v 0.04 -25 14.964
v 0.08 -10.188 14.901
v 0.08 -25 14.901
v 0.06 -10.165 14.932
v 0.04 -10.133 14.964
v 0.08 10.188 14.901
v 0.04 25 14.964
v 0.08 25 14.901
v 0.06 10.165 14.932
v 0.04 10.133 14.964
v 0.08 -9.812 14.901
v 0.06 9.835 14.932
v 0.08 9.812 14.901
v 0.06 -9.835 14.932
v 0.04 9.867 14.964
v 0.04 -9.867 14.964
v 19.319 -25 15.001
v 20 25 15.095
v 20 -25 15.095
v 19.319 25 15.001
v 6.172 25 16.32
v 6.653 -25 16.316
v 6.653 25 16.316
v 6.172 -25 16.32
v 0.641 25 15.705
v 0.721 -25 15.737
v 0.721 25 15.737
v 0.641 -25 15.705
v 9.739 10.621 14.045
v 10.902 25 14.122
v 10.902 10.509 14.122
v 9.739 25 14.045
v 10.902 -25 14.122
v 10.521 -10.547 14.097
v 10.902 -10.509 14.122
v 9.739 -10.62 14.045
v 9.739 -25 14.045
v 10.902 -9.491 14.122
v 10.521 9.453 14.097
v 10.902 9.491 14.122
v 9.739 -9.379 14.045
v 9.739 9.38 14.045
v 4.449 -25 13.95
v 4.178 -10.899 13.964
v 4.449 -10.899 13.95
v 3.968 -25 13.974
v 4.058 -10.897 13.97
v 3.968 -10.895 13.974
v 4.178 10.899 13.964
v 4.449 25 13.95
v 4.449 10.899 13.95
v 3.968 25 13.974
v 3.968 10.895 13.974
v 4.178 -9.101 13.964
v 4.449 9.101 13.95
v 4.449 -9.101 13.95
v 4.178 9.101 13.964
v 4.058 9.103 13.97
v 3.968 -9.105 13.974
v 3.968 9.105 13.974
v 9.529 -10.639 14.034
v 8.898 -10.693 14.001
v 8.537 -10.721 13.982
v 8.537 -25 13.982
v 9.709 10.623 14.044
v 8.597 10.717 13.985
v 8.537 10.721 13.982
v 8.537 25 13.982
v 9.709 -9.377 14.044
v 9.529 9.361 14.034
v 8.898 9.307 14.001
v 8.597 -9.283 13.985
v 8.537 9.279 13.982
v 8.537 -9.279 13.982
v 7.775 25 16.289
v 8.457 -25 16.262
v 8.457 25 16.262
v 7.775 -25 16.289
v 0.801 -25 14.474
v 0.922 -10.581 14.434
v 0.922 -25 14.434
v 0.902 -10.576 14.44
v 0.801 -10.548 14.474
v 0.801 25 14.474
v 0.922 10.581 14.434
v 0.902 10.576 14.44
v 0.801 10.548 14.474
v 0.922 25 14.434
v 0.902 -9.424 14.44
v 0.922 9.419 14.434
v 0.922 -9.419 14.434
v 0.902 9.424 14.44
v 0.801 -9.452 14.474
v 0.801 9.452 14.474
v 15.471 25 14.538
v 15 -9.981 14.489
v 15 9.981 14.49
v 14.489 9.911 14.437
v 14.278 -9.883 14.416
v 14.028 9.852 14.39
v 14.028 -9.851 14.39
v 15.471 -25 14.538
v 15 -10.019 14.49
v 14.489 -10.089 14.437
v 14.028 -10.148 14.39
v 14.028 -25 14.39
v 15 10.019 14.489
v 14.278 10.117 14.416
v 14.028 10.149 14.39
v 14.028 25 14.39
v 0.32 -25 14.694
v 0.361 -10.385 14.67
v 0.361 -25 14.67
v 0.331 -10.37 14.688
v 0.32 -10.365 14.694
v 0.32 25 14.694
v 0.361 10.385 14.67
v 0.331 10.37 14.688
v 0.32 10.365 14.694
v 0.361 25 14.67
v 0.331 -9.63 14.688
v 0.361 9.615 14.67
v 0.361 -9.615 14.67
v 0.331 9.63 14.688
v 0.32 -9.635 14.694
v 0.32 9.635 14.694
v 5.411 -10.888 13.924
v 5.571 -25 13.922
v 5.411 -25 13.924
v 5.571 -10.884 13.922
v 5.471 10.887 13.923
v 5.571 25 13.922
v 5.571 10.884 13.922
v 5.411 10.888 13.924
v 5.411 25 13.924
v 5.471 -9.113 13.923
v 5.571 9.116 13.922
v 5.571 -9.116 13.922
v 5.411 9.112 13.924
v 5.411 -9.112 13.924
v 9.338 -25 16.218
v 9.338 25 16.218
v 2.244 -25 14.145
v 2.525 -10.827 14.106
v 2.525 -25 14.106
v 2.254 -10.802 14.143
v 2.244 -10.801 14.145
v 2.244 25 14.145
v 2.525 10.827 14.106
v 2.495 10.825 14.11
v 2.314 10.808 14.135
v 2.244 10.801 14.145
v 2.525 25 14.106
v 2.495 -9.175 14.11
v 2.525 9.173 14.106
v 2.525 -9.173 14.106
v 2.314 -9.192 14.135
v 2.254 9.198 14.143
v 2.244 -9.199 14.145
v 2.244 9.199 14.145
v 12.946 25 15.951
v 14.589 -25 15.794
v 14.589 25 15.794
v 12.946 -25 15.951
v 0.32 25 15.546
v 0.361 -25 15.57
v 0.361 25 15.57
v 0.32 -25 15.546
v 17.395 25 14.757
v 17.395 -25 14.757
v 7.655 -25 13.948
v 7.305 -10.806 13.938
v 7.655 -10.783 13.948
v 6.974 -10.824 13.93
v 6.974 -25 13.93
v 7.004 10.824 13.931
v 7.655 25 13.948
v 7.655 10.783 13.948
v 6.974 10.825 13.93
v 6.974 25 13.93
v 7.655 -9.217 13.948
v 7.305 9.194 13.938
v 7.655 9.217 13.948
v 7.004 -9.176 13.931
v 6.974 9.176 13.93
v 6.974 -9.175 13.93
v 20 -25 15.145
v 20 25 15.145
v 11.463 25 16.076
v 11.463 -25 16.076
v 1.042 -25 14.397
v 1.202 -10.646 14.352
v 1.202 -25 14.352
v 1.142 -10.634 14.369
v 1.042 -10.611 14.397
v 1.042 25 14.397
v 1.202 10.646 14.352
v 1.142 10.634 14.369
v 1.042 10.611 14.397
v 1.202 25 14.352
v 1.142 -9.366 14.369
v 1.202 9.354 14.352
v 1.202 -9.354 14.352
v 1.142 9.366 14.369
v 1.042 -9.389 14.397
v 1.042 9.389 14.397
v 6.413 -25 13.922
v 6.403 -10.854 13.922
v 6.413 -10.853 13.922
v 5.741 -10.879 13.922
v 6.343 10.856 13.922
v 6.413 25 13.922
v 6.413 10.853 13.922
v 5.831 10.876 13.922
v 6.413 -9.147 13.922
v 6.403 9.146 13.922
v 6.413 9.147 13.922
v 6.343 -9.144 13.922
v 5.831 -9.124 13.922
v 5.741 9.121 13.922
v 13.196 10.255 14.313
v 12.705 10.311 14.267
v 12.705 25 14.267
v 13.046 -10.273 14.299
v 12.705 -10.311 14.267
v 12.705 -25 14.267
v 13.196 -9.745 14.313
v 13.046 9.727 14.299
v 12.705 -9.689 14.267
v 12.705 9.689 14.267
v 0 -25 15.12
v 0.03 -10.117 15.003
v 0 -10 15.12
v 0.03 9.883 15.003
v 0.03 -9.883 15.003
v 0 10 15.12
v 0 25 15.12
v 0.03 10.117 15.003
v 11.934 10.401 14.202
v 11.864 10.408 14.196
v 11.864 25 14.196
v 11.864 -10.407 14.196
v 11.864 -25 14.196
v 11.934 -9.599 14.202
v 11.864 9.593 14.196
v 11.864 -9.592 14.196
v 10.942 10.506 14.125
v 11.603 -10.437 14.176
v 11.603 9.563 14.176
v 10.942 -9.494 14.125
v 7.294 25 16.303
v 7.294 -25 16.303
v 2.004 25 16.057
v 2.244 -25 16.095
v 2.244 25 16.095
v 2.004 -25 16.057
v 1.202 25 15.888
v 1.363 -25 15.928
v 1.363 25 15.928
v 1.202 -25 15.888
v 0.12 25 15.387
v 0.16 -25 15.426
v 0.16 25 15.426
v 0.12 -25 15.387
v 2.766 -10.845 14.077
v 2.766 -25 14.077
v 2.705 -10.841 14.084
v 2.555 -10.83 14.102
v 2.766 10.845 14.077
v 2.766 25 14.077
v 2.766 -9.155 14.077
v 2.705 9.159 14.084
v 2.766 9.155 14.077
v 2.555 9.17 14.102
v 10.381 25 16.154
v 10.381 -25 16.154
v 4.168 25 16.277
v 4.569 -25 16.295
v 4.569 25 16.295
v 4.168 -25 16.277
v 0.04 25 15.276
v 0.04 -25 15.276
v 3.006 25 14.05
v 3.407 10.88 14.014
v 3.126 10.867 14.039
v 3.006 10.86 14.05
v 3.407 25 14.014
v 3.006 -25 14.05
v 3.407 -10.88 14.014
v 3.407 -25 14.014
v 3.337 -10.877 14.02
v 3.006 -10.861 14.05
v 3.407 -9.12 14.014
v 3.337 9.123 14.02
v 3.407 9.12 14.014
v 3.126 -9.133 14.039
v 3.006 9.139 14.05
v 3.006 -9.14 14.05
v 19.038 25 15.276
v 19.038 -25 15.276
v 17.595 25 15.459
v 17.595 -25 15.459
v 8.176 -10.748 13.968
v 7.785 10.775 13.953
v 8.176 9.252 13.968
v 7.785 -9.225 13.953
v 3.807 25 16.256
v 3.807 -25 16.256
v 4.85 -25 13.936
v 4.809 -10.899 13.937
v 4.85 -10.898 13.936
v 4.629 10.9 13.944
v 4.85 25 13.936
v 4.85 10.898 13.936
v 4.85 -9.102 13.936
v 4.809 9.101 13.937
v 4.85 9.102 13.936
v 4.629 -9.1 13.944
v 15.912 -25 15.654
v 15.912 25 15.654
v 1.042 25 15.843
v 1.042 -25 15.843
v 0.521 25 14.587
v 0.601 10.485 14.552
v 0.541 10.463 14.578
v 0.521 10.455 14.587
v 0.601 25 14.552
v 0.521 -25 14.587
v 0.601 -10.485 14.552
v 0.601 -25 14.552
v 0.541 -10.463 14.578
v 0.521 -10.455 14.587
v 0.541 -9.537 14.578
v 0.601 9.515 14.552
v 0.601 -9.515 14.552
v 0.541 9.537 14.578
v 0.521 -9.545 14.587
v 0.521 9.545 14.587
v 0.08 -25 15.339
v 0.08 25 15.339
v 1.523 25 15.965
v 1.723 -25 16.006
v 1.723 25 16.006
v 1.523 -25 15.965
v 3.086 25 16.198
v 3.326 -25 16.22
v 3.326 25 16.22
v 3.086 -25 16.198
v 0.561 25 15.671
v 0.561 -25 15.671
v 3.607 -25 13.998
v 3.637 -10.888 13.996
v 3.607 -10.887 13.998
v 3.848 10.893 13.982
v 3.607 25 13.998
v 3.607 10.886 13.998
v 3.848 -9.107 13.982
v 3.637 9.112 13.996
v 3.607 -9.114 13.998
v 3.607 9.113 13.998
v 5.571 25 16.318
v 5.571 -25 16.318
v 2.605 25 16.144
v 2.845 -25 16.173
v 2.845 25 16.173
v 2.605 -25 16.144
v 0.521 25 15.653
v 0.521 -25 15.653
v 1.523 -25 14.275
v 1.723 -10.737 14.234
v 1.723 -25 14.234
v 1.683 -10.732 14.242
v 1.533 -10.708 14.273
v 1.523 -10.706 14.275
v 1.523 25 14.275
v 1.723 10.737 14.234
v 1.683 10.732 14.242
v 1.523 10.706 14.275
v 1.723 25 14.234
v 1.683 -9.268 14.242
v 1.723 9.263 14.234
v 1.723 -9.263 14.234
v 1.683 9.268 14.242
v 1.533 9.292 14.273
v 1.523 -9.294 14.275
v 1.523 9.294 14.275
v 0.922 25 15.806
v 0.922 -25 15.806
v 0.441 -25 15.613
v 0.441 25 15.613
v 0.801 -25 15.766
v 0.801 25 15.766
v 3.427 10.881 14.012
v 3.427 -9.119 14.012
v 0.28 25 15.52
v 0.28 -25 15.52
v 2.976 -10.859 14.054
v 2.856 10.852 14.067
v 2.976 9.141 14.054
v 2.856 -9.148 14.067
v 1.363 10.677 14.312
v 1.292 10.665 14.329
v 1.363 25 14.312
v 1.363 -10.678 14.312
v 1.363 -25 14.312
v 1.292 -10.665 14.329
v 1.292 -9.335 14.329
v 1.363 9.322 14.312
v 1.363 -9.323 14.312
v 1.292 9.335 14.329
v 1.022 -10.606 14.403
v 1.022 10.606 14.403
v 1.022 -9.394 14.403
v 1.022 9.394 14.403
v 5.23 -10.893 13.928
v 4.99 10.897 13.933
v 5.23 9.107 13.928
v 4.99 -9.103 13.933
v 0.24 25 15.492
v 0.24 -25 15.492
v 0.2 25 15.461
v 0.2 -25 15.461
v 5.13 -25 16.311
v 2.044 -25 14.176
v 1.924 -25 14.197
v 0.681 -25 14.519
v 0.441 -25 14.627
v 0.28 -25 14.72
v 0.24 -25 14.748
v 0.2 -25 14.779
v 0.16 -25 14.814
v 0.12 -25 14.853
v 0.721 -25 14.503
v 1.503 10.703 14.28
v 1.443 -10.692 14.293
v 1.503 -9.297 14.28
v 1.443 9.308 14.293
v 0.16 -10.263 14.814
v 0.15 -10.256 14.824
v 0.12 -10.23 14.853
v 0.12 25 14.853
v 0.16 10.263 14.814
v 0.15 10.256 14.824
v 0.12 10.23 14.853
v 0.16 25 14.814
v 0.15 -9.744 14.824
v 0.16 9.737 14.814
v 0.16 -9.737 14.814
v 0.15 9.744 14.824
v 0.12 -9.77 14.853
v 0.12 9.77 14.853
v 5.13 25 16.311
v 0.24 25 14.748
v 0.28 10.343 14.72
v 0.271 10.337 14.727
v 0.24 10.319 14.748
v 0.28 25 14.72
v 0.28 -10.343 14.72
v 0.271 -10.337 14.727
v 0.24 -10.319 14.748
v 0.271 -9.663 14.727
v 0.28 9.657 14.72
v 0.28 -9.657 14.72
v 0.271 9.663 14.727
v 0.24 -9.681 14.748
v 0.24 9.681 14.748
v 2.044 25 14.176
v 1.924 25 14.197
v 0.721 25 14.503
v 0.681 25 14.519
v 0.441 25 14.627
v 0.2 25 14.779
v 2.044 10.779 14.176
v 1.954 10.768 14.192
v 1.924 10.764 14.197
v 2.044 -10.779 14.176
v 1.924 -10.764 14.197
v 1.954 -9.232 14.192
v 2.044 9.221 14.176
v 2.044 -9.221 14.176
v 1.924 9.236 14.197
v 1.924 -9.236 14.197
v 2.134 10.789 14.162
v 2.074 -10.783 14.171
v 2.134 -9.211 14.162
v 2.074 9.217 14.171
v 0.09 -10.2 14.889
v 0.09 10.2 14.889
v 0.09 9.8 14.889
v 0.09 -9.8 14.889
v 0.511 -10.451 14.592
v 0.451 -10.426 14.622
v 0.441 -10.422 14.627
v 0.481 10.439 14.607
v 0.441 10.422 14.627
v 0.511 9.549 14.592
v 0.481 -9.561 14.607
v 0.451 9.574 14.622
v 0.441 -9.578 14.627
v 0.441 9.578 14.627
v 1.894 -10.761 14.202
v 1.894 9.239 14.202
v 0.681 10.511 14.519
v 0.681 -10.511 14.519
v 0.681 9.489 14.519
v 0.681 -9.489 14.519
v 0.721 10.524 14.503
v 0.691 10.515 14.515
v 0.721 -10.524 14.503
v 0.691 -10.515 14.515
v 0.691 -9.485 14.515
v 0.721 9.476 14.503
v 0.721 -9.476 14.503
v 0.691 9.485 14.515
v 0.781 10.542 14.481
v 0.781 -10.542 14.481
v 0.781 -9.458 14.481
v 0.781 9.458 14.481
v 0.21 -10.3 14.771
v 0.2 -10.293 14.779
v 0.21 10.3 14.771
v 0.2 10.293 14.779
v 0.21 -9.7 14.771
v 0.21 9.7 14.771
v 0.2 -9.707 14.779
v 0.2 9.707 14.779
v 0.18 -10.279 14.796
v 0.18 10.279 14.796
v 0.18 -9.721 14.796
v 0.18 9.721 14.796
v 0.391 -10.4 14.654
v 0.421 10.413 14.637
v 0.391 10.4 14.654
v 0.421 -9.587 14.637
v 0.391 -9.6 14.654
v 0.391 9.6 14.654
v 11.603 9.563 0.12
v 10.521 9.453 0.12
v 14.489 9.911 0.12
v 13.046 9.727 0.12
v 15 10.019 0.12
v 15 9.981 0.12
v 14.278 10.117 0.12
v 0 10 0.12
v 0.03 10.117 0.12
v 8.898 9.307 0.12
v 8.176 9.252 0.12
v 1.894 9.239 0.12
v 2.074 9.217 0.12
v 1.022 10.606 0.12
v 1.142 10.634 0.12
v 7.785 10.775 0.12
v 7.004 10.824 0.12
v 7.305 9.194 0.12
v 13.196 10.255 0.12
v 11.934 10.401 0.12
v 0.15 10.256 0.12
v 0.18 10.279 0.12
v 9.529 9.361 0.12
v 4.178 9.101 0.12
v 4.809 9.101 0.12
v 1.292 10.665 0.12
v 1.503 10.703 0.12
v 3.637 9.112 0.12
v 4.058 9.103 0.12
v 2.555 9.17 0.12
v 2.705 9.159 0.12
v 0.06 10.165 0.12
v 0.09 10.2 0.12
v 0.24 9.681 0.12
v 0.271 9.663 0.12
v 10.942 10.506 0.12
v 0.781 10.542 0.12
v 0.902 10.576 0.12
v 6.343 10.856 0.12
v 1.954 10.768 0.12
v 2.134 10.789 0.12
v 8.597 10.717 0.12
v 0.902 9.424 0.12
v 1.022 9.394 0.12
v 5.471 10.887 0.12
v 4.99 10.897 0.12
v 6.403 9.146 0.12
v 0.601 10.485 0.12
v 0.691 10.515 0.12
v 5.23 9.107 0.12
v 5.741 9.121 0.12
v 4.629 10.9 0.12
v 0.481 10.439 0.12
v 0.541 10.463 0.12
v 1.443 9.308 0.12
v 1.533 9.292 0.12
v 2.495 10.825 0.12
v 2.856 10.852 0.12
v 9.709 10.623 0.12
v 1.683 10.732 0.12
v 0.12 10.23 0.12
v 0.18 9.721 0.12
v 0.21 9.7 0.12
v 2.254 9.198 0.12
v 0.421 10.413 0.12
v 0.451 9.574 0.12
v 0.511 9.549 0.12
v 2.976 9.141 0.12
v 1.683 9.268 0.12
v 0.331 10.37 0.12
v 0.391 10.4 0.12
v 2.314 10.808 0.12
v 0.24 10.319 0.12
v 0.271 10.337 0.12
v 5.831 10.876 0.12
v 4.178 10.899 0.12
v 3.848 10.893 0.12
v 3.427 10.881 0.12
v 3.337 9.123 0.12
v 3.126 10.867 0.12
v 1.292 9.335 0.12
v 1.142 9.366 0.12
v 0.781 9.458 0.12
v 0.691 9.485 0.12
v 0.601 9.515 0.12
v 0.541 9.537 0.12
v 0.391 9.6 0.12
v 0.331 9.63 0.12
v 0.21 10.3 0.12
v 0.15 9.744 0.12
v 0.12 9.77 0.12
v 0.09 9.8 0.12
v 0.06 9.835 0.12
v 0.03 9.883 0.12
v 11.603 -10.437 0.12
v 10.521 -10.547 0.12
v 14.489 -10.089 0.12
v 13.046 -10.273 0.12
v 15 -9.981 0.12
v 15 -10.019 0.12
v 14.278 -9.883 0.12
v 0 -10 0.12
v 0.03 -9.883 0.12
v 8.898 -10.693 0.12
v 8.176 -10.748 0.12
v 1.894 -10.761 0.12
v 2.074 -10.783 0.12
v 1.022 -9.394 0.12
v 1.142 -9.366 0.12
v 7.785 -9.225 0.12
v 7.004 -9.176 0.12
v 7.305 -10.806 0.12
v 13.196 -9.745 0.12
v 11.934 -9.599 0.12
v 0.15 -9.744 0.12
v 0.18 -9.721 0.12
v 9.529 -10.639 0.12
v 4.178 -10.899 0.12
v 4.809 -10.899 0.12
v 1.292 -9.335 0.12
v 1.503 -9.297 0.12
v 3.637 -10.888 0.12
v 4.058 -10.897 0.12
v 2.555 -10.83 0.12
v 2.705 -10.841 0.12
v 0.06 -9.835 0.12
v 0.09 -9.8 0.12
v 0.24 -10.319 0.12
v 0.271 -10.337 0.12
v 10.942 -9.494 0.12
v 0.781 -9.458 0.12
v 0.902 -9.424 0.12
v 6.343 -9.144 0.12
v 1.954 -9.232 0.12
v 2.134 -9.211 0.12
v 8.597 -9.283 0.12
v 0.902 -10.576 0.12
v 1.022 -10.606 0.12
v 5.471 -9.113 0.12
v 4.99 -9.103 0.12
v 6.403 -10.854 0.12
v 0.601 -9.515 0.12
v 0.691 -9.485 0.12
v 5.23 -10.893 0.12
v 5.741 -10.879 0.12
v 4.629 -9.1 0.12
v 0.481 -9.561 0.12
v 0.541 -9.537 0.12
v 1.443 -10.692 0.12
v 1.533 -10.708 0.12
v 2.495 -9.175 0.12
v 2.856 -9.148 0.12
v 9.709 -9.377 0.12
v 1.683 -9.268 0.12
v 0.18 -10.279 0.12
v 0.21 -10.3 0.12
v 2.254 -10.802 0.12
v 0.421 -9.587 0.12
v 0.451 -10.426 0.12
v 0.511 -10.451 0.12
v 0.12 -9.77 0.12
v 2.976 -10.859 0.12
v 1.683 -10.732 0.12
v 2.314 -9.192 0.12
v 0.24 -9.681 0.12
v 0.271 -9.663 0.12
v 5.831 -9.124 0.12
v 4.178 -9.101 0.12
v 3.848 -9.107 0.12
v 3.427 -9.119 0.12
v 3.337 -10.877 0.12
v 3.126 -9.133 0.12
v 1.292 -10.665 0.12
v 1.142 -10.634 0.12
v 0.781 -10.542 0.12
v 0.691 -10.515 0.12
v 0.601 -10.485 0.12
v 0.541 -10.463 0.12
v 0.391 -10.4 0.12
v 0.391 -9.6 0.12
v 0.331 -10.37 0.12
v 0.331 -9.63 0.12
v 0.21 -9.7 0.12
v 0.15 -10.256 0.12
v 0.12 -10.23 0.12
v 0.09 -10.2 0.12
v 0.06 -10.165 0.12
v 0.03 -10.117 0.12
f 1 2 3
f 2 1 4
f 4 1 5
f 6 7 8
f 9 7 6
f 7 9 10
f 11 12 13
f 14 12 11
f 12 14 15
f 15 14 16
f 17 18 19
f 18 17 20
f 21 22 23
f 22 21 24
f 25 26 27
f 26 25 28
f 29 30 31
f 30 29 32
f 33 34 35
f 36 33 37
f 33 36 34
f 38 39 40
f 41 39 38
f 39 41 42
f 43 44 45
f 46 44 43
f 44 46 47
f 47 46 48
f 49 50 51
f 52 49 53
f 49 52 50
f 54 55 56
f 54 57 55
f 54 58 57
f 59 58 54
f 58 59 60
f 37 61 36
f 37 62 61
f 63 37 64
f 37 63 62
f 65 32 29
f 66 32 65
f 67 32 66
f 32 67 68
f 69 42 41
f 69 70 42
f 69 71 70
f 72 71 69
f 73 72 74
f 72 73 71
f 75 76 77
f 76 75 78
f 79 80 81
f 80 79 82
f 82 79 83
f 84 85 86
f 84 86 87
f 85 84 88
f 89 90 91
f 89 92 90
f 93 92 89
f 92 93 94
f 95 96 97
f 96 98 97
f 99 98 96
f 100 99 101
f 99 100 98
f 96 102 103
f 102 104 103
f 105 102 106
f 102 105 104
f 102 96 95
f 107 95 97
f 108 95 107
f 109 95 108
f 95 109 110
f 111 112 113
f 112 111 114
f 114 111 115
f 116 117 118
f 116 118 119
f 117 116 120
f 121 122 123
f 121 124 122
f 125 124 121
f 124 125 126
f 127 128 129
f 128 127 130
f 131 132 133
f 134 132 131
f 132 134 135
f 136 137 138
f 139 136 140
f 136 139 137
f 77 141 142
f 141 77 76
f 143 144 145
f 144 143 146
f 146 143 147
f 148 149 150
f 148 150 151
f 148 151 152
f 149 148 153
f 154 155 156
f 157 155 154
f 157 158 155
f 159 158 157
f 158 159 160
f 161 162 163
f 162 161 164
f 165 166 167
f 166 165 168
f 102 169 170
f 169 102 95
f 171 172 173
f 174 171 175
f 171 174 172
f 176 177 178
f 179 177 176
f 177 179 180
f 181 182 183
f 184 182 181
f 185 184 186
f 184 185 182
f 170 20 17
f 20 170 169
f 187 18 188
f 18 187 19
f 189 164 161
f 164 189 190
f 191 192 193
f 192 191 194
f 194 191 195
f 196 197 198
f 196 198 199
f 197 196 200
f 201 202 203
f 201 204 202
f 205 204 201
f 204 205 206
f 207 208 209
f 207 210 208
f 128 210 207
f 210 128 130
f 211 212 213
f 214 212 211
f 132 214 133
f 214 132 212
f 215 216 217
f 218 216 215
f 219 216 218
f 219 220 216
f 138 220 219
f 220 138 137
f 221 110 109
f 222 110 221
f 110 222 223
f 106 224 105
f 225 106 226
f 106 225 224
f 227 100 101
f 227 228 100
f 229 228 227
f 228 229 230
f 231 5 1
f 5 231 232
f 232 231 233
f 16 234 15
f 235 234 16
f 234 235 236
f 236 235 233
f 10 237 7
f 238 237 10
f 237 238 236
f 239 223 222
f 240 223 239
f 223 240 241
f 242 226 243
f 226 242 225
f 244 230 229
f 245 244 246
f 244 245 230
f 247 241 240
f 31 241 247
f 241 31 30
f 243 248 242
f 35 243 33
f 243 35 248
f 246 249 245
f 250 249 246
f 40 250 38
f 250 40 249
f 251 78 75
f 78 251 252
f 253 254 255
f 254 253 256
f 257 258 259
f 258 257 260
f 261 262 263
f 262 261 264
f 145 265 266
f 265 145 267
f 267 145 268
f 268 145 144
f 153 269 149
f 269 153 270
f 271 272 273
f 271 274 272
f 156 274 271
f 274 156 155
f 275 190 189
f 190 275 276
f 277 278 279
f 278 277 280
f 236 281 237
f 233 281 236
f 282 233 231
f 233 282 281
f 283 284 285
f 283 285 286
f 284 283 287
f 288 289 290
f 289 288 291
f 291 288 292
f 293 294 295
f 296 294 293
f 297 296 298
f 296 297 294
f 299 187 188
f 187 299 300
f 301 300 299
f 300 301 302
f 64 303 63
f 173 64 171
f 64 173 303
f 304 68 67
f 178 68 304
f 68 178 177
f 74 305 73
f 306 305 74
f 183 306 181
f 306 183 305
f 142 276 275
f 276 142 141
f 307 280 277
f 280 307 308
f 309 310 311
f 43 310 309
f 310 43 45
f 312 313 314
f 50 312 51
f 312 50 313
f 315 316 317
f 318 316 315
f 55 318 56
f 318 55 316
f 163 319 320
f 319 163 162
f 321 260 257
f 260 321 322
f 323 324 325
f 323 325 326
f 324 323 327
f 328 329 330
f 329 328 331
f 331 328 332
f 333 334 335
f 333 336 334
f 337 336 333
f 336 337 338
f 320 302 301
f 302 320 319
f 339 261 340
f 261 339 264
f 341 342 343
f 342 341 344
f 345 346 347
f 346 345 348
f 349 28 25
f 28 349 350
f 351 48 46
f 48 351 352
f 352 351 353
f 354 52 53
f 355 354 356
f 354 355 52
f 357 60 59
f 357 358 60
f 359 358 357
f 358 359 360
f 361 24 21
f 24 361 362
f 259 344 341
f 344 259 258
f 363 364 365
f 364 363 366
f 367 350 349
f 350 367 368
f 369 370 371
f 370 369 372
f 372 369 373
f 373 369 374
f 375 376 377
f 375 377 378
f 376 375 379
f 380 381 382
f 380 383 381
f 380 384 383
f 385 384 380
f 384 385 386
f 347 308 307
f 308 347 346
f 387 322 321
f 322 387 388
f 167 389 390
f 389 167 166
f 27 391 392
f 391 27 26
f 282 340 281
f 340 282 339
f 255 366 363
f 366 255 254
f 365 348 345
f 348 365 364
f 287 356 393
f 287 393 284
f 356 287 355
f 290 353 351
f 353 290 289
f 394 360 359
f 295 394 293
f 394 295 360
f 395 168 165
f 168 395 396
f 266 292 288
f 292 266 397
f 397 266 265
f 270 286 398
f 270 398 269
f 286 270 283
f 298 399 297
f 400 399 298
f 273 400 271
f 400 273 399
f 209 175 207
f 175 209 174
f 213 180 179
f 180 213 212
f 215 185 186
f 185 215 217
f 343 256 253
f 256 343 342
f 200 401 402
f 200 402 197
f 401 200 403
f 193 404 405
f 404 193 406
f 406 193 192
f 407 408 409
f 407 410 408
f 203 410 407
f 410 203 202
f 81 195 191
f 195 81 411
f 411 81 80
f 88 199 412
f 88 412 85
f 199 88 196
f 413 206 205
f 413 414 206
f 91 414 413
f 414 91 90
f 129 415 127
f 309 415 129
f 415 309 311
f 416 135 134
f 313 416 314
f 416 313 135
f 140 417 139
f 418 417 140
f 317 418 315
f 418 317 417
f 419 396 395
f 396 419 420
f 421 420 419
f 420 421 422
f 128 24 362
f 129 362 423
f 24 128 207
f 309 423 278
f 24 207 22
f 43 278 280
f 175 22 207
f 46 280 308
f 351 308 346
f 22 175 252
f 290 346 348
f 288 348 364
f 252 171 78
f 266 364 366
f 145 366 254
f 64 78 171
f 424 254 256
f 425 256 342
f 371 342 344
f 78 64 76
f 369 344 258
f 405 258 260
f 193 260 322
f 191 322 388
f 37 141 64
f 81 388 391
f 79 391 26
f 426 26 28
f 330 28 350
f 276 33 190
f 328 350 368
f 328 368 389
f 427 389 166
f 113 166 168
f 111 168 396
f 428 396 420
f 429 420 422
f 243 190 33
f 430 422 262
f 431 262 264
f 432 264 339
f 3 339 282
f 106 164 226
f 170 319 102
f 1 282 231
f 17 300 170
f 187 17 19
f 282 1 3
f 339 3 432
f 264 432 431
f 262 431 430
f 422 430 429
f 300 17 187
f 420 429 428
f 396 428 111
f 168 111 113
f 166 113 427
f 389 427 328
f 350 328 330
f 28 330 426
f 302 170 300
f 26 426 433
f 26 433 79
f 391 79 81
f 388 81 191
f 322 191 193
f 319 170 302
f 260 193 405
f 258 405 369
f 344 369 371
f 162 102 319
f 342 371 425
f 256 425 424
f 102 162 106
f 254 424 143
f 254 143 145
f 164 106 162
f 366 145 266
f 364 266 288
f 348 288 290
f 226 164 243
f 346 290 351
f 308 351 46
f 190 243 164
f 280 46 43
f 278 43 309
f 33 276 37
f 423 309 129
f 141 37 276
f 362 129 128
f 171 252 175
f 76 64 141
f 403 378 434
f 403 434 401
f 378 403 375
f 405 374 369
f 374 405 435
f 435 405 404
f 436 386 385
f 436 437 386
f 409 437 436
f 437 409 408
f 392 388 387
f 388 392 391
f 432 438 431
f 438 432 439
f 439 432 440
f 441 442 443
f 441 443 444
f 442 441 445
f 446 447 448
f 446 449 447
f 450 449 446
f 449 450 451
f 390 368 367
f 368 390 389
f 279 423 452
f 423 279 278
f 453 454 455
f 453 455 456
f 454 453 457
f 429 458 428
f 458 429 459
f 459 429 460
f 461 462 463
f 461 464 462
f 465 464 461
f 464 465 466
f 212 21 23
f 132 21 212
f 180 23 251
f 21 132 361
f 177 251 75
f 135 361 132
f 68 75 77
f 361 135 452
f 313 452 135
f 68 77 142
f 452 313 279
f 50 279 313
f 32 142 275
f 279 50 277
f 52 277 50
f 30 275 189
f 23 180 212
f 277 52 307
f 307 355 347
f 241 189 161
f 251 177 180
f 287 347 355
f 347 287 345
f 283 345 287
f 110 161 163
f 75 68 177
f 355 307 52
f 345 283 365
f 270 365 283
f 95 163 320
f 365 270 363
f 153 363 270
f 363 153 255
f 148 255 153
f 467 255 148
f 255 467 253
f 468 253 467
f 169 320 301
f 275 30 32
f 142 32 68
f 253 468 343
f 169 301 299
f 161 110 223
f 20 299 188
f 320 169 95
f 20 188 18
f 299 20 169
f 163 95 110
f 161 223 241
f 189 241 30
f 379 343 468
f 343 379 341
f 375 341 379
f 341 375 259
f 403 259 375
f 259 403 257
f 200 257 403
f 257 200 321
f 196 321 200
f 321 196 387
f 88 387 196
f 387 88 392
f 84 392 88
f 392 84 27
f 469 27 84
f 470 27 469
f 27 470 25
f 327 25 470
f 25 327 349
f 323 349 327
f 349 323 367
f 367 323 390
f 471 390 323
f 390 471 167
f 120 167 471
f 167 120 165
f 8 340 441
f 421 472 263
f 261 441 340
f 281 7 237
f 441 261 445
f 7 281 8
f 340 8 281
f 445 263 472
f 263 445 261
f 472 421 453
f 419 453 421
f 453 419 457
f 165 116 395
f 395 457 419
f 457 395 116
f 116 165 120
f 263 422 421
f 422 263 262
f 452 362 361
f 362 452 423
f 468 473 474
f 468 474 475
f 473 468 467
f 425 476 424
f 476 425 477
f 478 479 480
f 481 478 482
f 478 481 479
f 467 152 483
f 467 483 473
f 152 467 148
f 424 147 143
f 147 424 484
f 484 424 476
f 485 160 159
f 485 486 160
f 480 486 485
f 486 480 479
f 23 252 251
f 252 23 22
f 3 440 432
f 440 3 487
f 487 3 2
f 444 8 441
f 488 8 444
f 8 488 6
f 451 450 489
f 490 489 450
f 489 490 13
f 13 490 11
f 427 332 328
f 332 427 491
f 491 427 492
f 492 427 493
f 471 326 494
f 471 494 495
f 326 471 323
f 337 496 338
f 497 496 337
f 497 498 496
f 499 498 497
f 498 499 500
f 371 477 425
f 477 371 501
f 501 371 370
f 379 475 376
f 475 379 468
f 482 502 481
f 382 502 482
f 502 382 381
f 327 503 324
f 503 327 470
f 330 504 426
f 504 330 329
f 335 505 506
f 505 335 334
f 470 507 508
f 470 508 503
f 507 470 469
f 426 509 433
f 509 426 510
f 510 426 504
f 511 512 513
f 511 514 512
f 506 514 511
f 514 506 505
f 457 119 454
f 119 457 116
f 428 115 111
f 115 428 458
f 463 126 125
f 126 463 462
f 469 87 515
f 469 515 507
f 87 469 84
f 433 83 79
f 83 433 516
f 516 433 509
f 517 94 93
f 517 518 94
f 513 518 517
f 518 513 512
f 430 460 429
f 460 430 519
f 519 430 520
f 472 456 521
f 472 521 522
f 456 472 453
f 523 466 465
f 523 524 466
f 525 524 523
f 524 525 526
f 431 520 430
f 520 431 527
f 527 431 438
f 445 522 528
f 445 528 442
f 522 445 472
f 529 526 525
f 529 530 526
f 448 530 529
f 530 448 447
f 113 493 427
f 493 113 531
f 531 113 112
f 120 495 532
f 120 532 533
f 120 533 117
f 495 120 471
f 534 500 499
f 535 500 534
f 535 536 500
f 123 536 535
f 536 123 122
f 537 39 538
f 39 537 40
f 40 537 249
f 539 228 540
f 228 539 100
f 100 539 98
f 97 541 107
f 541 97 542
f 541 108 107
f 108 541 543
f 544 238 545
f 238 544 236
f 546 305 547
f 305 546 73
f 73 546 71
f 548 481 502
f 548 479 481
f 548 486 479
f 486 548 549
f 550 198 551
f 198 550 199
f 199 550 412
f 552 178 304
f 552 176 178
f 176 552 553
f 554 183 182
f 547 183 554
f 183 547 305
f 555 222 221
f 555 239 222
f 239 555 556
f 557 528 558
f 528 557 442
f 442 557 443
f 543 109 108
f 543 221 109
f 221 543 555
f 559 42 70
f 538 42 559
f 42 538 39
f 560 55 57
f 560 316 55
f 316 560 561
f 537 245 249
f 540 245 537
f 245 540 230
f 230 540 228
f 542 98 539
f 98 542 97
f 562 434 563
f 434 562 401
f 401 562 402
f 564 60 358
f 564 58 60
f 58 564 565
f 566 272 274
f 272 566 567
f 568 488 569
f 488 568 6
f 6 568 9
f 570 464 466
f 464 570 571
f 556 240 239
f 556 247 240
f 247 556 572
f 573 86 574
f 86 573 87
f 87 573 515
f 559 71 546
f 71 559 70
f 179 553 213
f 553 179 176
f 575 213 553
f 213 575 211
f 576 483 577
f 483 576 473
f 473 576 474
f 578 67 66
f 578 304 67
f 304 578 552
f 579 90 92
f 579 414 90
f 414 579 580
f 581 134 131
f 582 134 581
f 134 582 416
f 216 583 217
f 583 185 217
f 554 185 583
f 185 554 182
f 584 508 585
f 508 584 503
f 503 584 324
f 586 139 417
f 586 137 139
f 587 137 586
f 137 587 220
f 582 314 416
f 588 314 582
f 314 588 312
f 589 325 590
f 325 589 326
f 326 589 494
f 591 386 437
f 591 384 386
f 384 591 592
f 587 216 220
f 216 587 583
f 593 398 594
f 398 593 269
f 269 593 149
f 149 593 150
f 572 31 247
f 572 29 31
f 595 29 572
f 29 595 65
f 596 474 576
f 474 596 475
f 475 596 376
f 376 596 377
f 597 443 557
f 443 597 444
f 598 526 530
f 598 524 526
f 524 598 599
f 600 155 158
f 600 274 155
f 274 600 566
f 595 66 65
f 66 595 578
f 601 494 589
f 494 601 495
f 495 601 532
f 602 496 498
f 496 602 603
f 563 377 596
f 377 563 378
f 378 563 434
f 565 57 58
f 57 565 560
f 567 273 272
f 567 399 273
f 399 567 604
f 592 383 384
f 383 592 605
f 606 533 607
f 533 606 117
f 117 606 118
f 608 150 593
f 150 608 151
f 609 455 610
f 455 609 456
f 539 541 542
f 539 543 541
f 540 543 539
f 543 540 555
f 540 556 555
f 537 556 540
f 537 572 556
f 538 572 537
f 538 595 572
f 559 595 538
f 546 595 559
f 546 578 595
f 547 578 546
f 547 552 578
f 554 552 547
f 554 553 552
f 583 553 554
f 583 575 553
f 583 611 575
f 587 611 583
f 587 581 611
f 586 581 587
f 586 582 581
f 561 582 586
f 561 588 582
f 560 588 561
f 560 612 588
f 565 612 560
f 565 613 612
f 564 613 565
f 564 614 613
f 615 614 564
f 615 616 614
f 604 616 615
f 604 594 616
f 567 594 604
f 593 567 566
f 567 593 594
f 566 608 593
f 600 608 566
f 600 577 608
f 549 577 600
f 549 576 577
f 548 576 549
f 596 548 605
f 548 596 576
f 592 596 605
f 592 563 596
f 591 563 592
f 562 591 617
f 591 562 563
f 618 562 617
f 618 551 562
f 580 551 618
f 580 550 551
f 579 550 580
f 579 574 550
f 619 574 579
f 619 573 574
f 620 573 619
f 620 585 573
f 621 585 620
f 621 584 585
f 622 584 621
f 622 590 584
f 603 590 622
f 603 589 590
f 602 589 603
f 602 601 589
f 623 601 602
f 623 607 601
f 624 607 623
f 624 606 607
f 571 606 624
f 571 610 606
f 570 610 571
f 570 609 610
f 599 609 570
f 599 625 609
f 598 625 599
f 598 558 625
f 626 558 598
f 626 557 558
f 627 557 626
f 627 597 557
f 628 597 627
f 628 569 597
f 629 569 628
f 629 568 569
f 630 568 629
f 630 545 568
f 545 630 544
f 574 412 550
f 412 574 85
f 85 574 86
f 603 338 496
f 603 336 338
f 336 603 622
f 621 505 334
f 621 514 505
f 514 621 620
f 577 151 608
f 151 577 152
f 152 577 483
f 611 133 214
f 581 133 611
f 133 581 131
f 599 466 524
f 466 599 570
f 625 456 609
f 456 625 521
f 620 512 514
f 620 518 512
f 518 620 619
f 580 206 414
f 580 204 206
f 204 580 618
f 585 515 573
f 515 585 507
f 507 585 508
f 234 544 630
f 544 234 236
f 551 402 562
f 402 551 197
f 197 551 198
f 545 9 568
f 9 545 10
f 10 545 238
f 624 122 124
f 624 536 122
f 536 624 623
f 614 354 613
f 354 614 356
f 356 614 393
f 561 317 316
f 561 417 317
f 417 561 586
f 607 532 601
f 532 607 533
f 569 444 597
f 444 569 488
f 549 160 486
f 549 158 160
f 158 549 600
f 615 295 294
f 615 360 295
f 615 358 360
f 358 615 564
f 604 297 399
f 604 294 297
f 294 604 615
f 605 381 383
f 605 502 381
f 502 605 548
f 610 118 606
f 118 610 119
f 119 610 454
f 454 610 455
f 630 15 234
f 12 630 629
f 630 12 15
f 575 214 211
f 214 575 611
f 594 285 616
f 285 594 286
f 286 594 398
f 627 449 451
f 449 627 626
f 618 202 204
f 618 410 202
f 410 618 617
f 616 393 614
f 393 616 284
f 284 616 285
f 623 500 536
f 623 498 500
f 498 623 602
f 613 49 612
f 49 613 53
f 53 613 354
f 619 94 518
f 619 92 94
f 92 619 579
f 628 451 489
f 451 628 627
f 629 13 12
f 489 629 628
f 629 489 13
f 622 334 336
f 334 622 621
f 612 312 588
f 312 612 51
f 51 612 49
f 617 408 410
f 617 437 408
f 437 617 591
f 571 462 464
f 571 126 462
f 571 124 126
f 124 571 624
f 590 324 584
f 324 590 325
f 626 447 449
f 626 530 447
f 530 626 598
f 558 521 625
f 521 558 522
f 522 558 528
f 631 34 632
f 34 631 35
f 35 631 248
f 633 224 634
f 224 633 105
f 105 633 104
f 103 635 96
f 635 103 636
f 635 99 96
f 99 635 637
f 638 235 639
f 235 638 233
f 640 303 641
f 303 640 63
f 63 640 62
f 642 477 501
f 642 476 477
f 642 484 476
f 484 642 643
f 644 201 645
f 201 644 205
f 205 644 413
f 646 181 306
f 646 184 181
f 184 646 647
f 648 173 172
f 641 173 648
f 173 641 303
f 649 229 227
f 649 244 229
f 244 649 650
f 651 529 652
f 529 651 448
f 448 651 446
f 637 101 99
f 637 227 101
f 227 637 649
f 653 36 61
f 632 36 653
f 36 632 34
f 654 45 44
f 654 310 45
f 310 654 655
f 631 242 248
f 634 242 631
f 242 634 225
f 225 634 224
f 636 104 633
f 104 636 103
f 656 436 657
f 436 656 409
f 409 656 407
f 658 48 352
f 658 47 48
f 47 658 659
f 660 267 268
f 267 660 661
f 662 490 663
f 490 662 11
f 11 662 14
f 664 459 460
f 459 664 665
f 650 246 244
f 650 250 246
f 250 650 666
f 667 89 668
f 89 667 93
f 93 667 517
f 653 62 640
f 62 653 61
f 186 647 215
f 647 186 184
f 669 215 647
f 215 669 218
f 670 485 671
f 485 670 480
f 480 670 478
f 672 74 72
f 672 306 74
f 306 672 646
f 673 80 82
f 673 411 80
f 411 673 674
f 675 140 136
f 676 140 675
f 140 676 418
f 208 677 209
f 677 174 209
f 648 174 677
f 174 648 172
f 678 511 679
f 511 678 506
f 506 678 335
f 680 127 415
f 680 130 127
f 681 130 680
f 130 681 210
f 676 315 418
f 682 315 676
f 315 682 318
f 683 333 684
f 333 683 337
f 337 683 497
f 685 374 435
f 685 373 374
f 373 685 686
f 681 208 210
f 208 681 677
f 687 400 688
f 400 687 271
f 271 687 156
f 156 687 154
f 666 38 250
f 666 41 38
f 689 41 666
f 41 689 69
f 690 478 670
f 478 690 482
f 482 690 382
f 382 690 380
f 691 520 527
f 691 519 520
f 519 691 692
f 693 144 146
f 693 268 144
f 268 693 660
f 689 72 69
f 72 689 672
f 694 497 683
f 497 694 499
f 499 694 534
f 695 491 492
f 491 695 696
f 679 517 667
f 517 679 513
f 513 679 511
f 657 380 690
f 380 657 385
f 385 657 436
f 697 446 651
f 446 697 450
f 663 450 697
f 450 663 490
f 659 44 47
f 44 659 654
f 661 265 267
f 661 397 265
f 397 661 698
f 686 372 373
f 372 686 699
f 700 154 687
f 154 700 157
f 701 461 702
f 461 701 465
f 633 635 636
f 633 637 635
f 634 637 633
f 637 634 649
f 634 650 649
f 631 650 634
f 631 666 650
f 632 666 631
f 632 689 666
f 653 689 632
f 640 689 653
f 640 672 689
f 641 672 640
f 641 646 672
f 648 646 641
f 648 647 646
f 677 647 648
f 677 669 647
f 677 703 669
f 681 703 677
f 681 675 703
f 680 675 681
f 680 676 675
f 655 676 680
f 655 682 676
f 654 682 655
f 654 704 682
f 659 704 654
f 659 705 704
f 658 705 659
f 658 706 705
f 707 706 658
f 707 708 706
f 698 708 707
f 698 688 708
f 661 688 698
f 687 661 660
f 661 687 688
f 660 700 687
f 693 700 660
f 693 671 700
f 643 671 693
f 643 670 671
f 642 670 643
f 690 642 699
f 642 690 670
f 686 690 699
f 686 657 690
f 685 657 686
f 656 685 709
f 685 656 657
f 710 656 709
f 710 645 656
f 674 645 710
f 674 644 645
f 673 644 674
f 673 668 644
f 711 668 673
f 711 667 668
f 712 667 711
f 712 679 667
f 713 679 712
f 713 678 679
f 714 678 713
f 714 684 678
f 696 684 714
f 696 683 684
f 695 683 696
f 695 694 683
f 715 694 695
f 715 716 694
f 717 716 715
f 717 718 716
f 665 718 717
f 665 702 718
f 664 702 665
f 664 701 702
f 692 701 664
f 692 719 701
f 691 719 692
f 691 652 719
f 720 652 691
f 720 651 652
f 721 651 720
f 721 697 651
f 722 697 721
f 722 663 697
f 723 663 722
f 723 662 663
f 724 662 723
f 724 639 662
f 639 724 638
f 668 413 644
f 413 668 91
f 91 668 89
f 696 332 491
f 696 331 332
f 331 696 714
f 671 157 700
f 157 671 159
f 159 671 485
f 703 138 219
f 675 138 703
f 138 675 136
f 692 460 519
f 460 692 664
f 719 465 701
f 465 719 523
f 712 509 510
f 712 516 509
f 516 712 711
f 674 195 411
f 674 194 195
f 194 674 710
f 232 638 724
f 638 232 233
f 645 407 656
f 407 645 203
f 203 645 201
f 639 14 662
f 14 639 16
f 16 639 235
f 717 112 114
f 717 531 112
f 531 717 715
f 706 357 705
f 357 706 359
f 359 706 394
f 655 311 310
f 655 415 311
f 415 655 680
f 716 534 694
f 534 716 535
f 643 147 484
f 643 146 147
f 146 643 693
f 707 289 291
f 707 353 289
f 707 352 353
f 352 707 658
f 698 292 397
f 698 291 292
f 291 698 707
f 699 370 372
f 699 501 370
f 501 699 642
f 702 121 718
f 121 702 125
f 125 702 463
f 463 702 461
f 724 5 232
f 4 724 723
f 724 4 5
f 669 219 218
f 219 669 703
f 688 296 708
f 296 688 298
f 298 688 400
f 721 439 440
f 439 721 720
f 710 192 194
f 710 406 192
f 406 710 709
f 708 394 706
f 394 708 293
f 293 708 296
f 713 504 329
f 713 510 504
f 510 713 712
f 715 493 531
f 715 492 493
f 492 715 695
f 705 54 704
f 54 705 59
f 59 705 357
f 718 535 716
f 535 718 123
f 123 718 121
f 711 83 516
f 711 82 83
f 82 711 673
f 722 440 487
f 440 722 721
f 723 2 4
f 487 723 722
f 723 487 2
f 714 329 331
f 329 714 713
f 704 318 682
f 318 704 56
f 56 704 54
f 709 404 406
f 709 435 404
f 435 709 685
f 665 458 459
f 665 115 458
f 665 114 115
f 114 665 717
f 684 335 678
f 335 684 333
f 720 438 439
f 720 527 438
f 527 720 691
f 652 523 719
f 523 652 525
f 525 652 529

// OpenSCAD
function naca_half_thickness(x,t) = 5*t*(0.2969*sqrt(x) - 0.1260*x - 0.3516*pow(x,2) + 0.2843*pow(x,3) - 0.1015*pow(x,4));
function naca_top_coordinates(t,n) = [for(x=[0:1/(n-1):1]) [x,naca_half_thickness(x,t)]];
function naca_bottom_coordinates(t,n) = [for(x=[1:-1/(n-1):0]) [x,-naca_half_thickness(x,t)]];
function naca_coordinates(t,n) = concat(naca_top_coordinates(t,n), naca_bottom_coordinates(t,n));
module naca_airfoil(chord,t,n) {
    points = naca_coordinates(t=t,n=n);
    scale([chord,chord,1])
        polygon(points);
}
module naca_wing(chord,t,n,span,center=false) {
    linear_extrude(height=span,center=center)
        naca_airfoil(chord,t,n);
}
module car_spoiler(top_chord=20,t=0.12,n=500,top_span=50,base_chord=15,base_span=15,base_gap=10) {
    translate([0,0,0.12+base_span]) {
        rotate([90,0,0])
            naca_wing(chord=top_chord,t=t,n=n,span=top_span,center=true);
        translate([0,base_gap,-base_span])
            naca_wing(chord=base_chord,t=t,n=n,span=base_span);
        translate([0,-base_gap,-base_span])
            naca_wing(chord=base_chord,t=t,n=n,span=base_span);
    }
}
car_spoiler();
